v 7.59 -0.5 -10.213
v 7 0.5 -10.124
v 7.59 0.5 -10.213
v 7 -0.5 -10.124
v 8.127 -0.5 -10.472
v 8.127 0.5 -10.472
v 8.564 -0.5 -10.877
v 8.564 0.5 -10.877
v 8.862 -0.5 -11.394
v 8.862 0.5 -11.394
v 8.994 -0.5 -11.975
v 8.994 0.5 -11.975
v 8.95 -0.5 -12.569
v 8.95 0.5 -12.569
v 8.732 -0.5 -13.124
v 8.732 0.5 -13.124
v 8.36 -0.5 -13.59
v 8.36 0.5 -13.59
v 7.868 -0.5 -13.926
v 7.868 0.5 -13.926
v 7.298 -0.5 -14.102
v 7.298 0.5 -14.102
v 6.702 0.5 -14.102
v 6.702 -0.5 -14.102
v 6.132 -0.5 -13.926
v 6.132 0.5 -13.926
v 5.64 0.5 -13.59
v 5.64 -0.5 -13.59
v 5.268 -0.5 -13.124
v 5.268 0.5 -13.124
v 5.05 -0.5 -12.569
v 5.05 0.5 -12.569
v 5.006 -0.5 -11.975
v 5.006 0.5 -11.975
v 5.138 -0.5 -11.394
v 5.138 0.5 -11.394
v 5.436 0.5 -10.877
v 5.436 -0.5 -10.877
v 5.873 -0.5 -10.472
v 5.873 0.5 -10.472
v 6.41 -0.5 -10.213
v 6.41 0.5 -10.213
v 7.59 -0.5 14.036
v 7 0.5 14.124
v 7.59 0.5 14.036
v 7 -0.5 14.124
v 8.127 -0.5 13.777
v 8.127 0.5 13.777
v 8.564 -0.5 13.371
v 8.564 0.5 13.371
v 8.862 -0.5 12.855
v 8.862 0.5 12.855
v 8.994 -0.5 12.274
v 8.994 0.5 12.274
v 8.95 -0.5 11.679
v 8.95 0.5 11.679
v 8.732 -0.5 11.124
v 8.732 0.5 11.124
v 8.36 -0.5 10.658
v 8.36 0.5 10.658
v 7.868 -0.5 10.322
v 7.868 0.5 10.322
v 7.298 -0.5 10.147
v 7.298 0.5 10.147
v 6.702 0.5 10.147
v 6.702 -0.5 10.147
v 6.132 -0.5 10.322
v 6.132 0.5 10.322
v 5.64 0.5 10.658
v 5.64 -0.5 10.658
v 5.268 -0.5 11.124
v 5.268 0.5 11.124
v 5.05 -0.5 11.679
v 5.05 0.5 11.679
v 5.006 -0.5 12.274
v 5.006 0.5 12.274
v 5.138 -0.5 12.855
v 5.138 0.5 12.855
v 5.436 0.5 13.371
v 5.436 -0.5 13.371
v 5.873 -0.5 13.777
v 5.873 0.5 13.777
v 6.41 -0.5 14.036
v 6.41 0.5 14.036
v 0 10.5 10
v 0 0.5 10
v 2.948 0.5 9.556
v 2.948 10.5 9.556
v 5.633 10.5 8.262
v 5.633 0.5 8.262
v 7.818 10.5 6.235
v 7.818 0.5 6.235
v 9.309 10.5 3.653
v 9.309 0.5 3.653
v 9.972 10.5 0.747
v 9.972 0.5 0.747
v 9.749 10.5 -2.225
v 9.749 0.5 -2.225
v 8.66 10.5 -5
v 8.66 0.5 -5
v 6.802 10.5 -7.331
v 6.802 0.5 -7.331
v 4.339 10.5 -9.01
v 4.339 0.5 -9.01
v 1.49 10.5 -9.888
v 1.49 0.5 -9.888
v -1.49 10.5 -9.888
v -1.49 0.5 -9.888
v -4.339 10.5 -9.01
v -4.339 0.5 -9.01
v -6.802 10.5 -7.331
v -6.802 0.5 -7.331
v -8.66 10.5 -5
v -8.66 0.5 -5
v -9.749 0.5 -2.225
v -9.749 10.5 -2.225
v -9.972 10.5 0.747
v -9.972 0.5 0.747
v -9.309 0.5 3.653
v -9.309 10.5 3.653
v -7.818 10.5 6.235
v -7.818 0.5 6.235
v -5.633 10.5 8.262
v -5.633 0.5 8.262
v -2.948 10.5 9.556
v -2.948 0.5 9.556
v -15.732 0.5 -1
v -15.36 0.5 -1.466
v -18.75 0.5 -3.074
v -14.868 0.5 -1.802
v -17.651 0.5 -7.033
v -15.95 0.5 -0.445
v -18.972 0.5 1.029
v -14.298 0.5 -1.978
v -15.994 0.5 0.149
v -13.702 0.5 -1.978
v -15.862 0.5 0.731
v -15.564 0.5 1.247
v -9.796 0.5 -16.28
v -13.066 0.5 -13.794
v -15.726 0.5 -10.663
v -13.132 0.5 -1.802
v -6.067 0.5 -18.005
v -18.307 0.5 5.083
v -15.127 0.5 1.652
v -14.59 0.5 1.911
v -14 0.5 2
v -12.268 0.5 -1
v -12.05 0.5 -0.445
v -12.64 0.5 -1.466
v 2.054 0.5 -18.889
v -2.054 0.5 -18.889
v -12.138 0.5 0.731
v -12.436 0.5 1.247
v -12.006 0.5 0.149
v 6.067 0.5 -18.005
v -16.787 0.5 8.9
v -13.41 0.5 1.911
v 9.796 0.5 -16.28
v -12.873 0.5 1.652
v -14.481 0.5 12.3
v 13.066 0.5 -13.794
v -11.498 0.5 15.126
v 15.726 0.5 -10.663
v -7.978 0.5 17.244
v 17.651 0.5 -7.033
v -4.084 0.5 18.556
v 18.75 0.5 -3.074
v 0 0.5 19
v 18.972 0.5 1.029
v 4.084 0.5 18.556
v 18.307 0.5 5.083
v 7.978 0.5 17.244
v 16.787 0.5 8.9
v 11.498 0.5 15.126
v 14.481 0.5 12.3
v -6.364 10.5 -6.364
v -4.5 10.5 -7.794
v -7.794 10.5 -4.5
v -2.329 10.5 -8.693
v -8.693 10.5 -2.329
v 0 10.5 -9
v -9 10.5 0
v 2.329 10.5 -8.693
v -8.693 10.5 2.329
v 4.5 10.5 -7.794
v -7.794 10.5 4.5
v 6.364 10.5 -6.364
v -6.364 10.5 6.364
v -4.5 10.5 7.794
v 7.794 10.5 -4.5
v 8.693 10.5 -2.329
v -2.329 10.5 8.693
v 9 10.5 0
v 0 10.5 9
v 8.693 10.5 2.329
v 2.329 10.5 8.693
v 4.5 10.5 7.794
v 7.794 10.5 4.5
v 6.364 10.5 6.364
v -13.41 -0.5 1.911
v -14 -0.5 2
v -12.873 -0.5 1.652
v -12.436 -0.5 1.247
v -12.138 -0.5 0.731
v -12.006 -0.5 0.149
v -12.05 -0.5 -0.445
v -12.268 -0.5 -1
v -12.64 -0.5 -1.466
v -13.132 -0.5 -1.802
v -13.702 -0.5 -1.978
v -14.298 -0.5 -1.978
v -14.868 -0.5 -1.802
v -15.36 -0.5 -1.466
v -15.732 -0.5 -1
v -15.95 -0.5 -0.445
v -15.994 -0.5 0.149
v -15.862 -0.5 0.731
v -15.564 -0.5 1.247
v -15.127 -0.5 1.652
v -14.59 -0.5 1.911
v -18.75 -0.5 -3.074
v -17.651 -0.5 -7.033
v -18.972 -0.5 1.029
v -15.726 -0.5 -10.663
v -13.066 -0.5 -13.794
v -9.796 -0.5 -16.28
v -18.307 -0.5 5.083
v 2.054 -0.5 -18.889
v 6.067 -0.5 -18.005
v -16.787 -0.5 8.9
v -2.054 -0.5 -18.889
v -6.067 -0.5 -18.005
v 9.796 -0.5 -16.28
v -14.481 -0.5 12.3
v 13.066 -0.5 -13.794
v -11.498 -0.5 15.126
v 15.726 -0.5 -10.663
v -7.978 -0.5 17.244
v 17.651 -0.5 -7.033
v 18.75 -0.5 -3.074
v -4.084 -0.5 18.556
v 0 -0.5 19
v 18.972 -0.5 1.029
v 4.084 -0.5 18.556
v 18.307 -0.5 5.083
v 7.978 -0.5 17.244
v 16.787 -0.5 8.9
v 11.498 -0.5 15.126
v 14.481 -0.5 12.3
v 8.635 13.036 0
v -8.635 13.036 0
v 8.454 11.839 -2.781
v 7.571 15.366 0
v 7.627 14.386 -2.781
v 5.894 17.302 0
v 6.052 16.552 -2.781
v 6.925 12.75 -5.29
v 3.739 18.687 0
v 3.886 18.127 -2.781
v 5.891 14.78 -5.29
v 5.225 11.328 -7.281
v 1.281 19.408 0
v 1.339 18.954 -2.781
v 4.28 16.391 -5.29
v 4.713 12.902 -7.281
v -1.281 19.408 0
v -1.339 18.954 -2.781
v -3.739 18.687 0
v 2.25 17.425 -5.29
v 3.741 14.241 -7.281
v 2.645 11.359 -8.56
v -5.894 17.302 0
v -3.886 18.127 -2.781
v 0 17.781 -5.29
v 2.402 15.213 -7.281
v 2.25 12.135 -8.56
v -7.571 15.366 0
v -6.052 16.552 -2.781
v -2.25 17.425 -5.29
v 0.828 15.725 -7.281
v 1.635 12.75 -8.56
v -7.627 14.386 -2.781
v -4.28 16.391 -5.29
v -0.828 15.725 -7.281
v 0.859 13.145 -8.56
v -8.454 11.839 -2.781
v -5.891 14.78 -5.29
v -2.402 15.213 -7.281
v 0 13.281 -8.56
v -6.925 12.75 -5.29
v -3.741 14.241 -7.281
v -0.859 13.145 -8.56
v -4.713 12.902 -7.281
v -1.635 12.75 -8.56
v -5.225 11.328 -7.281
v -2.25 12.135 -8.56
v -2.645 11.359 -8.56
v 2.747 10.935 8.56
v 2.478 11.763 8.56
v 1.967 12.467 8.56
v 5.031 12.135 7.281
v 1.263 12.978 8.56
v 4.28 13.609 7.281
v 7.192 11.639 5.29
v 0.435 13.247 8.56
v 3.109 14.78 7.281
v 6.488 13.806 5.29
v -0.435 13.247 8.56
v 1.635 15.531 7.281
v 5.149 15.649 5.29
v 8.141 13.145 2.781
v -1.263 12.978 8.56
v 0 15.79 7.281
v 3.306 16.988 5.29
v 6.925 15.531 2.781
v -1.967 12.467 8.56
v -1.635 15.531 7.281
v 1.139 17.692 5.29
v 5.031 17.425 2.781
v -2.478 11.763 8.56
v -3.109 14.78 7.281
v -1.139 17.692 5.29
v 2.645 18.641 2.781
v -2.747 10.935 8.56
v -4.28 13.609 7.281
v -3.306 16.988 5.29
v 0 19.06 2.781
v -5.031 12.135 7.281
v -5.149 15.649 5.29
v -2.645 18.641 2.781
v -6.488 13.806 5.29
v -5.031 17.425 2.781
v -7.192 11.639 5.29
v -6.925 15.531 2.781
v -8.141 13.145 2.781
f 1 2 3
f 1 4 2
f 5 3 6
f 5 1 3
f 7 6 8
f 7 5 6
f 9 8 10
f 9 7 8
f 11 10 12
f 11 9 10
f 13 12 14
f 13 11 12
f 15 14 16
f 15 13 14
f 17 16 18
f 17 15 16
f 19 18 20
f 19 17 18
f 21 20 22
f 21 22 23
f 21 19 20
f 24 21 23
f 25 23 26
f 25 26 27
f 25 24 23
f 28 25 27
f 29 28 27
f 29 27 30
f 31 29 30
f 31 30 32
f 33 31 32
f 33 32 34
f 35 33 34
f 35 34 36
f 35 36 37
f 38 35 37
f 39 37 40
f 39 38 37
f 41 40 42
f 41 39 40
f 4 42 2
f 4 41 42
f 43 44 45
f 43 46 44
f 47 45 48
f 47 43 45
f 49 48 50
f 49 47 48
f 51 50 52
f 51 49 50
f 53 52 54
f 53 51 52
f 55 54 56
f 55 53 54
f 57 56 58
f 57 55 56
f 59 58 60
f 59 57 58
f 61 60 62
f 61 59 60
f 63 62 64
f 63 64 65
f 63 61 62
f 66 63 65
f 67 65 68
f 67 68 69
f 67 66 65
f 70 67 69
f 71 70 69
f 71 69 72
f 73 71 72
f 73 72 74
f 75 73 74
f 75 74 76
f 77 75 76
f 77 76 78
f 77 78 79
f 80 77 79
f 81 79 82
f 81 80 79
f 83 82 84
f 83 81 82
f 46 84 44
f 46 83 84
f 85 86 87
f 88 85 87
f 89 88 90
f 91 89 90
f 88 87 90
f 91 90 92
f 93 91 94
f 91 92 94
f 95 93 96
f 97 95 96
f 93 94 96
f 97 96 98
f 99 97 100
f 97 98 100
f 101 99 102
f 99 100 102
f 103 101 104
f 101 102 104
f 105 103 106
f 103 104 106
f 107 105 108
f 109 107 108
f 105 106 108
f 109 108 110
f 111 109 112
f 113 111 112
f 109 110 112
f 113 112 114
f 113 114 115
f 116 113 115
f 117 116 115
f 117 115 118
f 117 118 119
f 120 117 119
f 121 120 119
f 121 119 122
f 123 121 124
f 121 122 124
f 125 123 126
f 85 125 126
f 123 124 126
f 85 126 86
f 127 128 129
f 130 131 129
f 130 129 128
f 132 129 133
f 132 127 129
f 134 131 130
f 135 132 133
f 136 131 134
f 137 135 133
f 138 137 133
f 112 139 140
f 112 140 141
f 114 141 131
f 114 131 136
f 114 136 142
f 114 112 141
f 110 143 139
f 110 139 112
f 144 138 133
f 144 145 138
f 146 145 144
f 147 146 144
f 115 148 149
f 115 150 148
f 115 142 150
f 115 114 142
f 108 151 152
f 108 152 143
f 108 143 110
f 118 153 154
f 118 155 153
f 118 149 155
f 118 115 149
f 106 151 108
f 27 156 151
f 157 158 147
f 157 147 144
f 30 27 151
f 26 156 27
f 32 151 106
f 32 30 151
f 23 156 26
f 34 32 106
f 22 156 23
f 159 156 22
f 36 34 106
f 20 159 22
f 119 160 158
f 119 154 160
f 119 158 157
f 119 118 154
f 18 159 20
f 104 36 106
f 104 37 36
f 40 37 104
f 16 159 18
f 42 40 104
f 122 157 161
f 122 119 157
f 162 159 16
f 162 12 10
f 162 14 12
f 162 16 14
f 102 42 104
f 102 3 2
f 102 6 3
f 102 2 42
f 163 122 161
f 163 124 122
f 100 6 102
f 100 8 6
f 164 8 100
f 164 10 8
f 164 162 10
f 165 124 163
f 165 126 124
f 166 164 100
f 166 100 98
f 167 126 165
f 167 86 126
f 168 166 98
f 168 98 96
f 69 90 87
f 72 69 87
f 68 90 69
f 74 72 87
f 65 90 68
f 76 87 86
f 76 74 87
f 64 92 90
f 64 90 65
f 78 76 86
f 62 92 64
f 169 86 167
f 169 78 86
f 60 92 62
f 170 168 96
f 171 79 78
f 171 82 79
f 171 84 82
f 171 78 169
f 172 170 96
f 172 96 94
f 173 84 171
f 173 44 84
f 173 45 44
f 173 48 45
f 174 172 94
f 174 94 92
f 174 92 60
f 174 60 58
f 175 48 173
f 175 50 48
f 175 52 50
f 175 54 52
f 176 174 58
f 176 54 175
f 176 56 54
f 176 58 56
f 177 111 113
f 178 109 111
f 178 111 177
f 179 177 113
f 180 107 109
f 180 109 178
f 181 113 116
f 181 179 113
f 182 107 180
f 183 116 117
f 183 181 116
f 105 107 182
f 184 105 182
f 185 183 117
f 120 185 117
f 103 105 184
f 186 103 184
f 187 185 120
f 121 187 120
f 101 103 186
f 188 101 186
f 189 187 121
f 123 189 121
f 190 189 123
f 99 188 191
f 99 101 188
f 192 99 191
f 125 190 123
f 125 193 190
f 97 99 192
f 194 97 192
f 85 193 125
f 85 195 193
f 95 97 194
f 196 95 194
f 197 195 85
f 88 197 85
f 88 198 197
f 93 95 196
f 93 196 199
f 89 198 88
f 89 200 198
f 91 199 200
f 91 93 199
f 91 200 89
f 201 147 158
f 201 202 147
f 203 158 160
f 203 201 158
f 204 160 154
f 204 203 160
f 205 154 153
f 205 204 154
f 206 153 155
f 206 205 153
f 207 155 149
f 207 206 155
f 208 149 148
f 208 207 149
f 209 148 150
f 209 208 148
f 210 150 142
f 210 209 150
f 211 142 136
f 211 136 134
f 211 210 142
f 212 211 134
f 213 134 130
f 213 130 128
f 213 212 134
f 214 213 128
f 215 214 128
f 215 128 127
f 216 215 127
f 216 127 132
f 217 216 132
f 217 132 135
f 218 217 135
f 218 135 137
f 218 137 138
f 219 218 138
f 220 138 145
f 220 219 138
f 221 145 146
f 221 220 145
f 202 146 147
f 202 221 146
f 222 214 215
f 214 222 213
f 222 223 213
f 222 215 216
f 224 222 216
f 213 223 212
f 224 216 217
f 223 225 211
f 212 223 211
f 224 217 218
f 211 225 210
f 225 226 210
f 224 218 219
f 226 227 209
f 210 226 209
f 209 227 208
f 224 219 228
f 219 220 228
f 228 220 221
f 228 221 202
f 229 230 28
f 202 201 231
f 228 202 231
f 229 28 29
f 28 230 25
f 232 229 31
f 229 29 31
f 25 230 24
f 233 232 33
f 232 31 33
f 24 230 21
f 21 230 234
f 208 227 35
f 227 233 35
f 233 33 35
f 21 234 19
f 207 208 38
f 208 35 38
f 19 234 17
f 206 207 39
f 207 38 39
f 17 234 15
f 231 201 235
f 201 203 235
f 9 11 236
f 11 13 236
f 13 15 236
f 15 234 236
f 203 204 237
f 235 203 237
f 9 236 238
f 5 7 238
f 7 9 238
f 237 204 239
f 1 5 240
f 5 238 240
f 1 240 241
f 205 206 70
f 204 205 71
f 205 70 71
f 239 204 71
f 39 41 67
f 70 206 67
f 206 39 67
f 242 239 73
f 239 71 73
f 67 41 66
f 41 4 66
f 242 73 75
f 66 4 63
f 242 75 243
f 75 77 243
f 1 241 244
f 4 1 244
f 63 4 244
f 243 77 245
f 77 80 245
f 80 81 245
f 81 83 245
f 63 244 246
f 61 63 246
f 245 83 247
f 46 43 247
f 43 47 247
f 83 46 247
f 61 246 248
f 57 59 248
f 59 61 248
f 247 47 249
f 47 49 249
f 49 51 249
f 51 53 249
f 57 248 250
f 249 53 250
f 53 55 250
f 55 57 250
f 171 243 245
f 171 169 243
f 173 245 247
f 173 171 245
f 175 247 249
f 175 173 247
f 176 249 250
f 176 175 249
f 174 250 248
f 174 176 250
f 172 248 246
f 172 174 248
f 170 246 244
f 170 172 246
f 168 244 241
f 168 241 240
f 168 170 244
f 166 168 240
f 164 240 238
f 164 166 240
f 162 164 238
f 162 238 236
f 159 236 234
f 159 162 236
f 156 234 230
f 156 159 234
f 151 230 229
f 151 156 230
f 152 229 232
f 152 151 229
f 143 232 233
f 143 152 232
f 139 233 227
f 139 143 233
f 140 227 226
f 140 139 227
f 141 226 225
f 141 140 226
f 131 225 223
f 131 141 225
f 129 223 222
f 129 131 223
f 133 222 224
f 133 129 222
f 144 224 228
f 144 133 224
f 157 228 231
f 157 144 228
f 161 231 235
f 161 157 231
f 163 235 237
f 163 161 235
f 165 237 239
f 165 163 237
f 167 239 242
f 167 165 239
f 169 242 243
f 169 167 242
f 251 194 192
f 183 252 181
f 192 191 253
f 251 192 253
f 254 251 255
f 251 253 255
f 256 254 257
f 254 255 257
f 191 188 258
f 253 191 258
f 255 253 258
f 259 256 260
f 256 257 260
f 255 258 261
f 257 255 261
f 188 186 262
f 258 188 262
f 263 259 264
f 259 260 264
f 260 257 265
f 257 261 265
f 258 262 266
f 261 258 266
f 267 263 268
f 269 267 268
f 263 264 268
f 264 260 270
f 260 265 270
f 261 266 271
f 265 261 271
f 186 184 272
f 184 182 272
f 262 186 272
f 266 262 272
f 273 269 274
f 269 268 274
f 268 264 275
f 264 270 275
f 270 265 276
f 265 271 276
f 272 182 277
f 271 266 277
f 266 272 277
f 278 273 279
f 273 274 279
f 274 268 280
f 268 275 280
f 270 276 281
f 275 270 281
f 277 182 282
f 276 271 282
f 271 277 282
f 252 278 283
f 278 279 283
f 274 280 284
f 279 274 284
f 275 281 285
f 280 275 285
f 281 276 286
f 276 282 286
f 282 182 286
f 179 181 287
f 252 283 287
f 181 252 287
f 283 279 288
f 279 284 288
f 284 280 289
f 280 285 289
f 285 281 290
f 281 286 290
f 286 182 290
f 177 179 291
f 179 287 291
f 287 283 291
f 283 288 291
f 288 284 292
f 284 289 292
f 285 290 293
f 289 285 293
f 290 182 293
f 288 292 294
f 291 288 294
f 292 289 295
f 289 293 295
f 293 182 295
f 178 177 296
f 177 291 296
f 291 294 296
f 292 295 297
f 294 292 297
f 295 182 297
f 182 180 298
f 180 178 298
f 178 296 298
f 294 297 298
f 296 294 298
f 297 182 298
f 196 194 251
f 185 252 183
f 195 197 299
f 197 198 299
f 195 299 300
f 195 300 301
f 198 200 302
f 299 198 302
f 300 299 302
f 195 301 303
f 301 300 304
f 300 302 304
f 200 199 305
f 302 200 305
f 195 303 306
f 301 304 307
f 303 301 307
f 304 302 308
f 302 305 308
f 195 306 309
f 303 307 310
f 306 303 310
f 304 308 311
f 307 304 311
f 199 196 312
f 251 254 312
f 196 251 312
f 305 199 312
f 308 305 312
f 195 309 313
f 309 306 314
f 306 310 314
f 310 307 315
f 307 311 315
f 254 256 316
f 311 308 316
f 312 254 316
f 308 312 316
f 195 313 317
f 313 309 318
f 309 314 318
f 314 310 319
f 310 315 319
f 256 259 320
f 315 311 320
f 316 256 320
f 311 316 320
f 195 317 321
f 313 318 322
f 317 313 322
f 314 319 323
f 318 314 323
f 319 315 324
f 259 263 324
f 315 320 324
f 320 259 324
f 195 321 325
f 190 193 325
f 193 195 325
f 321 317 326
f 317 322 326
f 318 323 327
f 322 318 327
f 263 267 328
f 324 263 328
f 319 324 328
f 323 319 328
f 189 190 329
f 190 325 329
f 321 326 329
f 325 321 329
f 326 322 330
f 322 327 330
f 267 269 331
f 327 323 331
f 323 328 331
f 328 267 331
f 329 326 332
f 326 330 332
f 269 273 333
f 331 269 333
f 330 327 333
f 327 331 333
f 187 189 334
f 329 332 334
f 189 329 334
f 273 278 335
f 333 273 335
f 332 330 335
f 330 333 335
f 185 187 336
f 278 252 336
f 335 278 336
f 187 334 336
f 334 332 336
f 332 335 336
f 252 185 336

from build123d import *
from build123d.topology import SkipClean

# Parameters (mm, degrees)
SKETCH1_R           = 19
SKETCH1_R_2         = 2
BOSS_EXTRUDE1_DEPTH = 0.5
SKETCH2_R           = 10
BOSS_EXTRUDE2_DEPTH = 10


with BuildPart() as part:
    # Sketch1 → Boss-Extrude1 (new, symmetric)
    with BuildSketch(Plane(origin=(0, 0, 0), x_dir=(1, 0, 0), z_dir=(0, 1, 0))):
        with Locations(Location((0, 0, 0), (0, 0, 270))):
            Circle(SKETCH1_R)
        with Locations(Location((-14, 0, 0), (0, 0, 270))):
            Circle(SKETCH1_R_2, mode=Mode.SUBTRACT)
        with Locations(Location((7, 12.124355653, 0), (0, 0, 270))):
            Circle(SKETCH1_R_2, mode=Mode.SUBTRACT)
        with Locations(Location((7, -12.124355653, 0), (0, 0, 270))):
            Circle(SKETCH1_R_2, mode=Mode.SUBTRACT)
    extrude(amount=BOSS_EXTRUDE1_DEPTH, both=True)

    # Sketch2 → Boss-Extrude2 (add)
    with BuildSketch(Plane(origin=(0, 0.5, 0), x_dir=(1, 0, 0), z_dir=(0, 1, 0))):
        with Locations(Location((0, 0, 0), (0, 0, 270))):
            Circle(SKETCH2_R)
    extrude(amount=BOSS_EXTRUDE2_DEPTH)

    # Sketch3 → Revolve1 (revolve)
    with SkipClean():  # the faces are left unmerged after this step: merging them gives an invalid solid
        with BuildSketch(Plane(origin=(0, 10.5, 0), x_dir=(1, 0, 0), z_dir=(0, 1, 0))):
            with BuildLine():
                ThreePointArc((9, 0), (6.363961031, 6.363961031), (0, 9))
                Line((0, 9), (0, -9))
                ThreePointArc((0, -9), (6.363961031, -6.363961031), (9, 0))
            make_face()
            with BuildLine():
                Line((0, -9), (0, 9))
                ThreePointArc((0, 9), (-9, 0), (0, -9))
            make_face()
        revolve(axis=Axis((0, 10.5, -9), (0, 0, 1)))


solid = part.part
